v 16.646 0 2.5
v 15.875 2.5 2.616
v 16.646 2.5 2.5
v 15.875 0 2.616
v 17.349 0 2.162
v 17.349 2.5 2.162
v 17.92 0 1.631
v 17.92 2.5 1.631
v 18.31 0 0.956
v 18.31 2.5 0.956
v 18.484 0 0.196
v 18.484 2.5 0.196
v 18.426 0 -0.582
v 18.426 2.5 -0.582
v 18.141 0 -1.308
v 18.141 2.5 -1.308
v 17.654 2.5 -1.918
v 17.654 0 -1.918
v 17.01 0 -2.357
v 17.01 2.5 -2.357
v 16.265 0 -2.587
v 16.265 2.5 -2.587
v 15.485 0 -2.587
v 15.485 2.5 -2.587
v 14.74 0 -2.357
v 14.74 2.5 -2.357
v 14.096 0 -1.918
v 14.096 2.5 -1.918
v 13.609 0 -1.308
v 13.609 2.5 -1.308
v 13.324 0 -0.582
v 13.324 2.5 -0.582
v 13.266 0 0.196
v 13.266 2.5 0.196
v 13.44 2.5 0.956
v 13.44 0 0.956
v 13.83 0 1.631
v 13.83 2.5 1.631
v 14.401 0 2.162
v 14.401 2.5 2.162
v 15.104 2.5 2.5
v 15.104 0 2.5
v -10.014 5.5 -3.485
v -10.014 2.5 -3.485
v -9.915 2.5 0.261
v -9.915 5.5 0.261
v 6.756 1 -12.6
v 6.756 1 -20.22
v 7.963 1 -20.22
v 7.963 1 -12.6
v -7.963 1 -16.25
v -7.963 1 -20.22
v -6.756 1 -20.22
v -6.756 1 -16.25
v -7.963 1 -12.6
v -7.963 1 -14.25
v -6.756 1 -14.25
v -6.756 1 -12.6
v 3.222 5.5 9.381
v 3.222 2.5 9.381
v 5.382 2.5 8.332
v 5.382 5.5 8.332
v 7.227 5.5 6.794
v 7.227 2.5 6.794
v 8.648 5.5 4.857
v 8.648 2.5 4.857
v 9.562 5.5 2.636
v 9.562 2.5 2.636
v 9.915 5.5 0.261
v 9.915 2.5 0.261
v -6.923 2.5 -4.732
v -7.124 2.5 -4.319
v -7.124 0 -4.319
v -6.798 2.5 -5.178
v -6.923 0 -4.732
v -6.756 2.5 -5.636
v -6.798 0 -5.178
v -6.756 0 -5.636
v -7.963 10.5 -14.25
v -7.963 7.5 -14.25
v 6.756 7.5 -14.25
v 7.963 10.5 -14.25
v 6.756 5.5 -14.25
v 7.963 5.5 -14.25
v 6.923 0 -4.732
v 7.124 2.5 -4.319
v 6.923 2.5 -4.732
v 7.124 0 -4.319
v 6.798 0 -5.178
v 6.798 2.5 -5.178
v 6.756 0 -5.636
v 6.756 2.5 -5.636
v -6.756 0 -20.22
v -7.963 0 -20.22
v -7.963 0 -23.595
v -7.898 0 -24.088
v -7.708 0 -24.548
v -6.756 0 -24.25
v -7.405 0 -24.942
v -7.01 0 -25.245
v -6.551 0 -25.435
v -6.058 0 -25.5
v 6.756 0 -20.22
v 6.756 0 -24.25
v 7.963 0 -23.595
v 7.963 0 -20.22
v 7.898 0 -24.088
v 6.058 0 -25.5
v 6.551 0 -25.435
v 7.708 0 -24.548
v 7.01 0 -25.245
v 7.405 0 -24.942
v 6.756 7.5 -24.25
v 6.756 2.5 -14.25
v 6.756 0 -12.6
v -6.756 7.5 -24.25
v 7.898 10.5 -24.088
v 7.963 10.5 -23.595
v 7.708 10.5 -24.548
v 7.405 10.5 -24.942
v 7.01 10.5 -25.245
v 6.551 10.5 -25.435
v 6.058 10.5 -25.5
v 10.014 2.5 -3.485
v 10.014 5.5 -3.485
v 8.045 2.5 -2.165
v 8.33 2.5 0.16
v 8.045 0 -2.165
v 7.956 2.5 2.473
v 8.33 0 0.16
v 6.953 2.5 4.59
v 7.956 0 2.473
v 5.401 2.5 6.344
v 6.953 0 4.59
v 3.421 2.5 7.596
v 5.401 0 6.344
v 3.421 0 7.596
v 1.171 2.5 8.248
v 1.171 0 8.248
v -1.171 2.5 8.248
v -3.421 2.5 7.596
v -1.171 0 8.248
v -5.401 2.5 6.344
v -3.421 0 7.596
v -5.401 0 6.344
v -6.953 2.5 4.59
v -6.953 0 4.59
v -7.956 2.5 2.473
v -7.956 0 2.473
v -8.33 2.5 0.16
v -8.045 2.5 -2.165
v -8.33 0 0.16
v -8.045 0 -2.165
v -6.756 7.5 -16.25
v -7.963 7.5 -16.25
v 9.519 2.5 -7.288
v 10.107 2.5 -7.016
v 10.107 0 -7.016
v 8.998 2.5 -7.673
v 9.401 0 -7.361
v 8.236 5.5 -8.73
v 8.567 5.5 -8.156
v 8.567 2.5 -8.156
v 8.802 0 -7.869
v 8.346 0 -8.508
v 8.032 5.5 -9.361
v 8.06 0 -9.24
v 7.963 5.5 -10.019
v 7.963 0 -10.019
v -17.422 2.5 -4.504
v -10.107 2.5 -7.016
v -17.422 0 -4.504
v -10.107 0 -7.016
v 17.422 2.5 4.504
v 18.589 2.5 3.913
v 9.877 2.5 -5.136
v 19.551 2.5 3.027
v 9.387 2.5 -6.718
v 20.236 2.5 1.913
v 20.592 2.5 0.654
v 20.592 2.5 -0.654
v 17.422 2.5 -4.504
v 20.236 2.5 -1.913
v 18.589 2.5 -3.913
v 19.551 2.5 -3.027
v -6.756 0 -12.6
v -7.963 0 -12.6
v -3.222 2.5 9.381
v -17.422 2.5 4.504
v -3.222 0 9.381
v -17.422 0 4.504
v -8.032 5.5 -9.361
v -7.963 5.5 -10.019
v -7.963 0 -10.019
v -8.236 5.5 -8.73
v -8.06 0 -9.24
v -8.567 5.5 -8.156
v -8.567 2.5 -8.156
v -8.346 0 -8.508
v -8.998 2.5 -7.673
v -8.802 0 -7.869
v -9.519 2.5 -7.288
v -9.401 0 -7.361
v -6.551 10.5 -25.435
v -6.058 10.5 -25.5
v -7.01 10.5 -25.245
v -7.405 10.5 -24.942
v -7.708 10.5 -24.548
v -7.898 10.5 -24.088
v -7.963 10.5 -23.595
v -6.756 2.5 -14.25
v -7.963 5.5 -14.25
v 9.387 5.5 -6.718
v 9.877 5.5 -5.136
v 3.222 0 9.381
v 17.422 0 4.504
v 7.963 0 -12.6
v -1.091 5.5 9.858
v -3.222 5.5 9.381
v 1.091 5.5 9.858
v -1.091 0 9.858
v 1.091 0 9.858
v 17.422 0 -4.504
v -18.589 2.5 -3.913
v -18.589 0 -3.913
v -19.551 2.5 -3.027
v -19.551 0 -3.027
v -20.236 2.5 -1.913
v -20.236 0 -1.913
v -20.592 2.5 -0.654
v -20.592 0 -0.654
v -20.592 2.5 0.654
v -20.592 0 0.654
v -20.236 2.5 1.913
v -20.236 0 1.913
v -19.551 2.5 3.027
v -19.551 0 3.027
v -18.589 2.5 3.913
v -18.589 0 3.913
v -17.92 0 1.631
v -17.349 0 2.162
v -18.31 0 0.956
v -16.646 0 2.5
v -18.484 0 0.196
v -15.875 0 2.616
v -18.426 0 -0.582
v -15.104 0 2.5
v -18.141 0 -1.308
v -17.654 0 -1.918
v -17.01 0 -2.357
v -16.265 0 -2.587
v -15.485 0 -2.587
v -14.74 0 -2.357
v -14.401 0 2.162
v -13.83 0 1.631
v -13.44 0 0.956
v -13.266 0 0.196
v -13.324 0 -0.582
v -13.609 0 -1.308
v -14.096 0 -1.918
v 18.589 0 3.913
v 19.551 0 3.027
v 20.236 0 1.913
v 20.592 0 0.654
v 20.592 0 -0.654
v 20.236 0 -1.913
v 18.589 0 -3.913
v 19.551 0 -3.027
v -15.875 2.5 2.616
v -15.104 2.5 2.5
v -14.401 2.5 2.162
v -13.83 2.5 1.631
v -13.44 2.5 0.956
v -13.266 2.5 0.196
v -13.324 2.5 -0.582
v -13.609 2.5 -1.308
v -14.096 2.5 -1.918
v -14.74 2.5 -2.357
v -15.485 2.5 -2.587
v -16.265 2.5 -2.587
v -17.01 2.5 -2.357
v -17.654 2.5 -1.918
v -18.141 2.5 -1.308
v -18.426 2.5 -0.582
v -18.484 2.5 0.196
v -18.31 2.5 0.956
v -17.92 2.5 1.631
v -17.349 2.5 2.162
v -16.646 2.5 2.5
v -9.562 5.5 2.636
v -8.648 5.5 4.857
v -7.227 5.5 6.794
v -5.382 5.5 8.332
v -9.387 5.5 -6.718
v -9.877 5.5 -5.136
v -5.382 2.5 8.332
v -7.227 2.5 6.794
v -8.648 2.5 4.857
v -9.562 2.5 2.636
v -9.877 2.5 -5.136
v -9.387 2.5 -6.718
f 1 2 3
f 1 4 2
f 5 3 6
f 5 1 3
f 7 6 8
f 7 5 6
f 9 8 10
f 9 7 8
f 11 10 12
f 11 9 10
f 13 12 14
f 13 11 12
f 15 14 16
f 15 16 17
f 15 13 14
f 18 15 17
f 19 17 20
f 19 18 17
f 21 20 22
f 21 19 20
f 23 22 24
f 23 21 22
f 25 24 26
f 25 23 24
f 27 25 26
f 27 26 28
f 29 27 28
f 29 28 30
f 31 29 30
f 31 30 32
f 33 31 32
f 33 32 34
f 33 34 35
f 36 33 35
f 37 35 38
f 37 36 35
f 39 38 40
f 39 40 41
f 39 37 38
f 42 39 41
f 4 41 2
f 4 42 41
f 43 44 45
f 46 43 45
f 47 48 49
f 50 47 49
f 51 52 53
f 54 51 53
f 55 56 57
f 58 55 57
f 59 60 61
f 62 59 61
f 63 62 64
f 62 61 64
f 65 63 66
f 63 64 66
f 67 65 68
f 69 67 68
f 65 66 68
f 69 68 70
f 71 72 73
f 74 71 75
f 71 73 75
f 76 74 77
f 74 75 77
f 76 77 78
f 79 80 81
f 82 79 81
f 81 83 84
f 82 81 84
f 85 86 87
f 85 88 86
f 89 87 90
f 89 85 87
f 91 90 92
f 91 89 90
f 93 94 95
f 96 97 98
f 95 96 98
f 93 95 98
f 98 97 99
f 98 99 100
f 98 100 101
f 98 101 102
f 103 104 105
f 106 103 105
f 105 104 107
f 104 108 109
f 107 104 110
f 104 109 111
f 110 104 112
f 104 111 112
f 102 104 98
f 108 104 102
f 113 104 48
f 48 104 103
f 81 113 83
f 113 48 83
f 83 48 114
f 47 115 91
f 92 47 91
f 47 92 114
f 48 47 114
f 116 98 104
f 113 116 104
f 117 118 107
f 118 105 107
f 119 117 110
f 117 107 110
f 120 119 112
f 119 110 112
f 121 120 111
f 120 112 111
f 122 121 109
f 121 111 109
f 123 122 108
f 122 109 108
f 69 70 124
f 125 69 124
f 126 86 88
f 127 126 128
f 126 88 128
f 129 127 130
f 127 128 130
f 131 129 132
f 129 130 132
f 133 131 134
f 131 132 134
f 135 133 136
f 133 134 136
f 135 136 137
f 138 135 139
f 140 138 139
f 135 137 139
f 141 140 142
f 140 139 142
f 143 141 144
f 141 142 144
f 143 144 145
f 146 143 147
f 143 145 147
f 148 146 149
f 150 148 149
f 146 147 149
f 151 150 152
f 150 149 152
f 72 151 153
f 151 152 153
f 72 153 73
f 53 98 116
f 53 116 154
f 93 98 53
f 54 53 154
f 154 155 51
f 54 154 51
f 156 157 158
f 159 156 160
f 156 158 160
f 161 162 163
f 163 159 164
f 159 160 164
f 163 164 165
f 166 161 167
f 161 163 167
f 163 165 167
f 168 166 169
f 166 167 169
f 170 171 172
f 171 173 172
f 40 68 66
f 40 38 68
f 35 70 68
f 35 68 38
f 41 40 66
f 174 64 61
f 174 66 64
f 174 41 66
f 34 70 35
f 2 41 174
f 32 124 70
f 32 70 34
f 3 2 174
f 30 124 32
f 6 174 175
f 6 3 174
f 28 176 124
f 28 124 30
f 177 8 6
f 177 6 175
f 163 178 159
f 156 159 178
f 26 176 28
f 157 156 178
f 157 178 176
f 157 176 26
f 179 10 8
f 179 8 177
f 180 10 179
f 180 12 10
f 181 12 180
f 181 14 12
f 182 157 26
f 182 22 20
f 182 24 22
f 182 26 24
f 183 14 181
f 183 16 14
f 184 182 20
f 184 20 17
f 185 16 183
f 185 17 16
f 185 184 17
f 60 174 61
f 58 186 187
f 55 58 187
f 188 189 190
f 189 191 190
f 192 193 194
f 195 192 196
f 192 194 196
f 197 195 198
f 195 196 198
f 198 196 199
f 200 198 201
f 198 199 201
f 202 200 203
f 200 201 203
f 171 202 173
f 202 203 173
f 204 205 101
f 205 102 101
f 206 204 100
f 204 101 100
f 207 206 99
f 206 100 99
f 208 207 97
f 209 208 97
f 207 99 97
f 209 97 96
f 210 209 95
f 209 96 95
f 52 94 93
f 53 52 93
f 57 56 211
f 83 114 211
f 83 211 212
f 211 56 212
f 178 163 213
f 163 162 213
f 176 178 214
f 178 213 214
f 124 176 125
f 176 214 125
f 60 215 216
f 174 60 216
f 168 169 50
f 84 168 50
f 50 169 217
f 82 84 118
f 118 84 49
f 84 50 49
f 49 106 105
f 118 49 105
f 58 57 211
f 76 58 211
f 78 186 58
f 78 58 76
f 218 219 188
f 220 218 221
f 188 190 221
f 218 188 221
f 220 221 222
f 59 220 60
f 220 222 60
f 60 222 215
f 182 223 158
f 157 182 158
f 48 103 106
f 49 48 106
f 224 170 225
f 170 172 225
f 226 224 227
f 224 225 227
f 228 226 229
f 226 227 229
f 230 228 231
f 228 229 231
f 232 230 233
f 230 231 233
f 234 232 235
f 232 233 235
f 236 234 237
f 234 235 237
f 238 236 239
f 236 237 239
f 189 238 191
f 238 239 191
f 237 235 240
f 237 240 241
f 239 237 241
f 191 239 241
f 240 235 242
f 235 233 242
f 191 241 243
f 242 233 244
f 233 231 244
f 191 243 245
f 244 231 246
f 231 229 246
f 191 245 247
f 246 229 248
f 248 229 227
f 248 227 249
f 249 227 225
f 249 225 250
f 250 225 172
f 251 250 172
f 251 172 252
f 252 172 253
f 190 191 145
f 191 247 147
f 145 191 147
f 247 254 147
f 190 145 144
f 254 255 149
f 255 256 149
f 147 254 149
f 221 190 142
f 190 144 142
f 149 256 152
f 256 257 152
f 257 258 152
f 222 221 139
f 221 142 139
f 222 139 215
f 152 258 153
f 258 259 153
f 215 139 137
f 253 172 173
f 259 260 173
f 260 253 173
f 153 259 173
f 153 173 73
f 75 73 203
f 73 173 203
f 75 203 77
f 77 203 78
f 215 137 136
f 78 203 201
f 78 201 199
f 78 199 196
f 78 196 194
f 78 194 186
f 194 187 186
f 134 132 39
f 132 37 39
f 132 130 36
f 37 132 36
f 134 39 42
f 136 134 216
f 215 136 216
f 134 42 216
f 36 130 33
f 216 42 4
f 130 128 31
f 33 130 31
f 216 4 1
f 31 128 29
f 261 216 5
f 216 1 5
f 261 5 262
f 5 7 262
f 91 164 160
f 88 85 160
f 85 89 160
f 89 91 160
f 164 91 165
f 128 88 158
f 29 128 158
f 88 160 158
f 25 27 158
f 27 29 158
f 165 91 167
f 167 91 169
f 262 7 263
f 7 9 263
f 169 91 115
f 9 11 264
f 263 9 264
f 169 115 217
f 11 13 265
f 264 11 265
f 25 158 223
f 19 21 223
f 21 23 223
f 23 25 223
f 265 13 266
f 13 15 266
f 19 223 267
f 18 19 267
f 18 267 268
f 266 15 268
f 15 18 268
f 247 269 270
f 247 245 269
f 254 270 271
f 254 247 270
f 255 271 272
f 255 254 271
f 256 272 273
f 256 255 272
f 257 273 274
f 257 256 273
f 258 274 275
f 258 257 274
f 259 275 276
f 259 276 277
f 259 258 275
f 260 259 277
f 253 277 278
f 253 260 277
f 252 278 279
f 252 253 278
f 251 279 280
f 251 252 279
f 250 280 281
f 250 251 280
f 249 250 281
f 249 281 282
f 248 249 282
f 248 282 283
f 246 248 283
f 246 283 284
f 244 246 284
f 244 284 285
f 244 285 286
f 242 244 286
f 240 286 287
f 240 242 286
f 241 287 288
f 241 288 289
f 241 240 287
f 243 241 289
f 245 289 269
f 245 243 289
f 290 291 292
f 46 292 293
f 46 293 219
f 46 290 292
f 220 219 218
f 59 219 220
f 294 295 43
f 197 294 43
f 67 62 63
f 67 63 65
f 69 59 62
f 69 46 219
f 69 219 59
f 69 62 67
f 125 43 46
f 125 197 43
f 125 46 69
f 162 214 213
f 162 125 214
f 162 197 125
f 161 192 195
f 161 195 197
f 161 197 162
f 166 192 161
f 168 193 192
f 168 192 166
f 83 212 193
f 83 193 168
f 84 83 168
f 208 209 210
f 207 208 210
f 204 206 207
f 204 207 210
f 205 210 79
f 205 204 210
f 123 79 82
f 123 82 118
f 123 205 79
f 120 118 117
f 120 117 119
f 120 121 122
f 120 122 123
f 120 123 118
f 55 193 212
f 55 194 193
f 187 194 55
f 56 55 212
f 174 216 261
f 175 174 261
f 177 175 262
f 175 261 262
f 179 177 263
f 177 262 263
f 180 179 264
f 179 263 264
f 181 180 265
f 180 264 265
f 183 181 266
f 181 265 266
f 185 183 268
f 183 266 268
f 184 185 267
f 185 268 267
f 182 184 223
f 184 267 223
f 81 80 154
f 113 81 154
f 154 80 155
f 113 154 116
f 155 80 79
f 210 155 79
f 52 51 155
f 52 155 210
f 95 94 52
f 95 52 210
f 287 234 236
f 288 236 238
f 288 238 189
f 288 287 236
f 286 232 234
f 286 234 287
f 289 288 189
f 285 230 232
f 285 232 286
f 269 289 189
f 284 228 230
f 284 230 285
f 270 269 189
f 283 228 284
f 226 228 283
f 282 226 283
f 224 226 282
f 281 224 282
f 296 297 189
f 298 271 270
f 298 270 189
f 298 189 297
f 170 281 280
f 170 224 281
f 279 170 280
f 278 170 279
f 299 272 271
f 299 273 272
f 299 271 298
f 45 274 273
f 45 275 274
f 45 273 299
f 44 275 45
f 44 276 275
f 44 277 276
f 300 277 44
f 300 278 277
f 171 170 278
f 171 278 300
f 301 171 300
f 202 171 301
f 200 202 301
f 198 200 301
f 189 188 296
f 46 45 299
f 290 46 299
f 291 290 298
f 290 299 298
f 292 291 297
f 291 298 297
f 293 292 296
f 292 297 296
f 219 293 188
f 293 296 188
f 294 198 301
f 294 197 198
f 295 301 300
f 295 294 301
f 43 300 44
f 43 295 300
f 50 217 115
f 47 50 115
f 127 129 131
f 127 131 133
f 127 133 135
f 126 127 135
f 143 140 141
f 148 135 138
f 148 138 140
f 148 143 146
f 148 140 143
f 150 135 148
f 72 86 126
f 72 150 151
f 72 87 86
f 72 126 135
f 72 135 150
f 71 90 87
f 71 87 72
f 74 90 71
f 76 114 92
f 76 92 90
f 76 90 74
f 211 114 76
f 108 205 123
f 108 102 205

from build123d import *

# Parameters (mm, degrees)
BOSS_EXTRUDE1_DEPTH   = 1
SKETCH3_R             = 2.6162
BOSS_EXTRUDE1_2_DEPTH = 1
SKETCH4_R             = 2.6162
BOSS_EXTRUDE2_DEPTH   = 1.5
BOSS_EXTRUDE3_DEPTH   = 3
SKETCH6_W             = 15.9258
SKETCH6_H             = 11.25
BOSS_EXTRUDE4_DEPTH   = 5
SKETCH7_W             = 13.5128
SKETCH7_H             = 10
CUT_EXTRUDE1_DEPTH    = 5
CUT_EXTRUDE2_DEPTH    = 5
FILLET1_R             = 2.54
FILLET2_R             = 2.54
FILLET3_R             = 7.62
FILLET4_R             = 1.905


with BuildPart() as part:
    # Sketch3 → Boss-Extrude1 (new body)
    with BuildSketch(Plane(origin=(0, 0, 0), x_dir=(1, 0, 0), z_dir=(0, 1, 0))):
        Polygon((6.7564, 24.25), (6.7564, 20.22), (7.9629, 20.22), (7.9629, 25.5), (-7.9629, 25.5), (-7.9629, 20.22), (-6.7564, 20.22), (-6.7564, 24.25), align=None)
    extrude(amount=BOSS_EXTRUDE1_DEPTH)



with BuildPart() as body_2:
    # Sketch3 → Boss-Extrude1 2 (new body)
    with BuildSketch(Plane(origin=(0, 0, 0), x_dir=(1, 0, 0), z_dir=(0, 1, 0))):
        with BuildLine():
            Line((6.7564, 12.6), (6.7564, 4.876812672))
            ThreePointArc((6.7564, 4.876812672), (6.776225919, 4.847421317), (6.796505263, 4.818340964))
            ThreePointArc((6.796505263, 4.818340964), (0, -8.3312), (-6.796505263, 4.818340964))
            ThreePointArc((-6.796505263, 4.818340964), (-6.776225919, 4.847421317), (-6.7564, 4.876812672))
            Line((-6.7564, 4.876812672), (-6.7564, 12.6))
            Line((-6.7564, 12.6), (-7.9629, 12.6))
            Line((-7.9629, 12.6), (-7.9629, 10.019330915))
            ThreePointArc((-7.9629, 10.019330915), (-8.553832276, 8.174549356), (-10.10666, 7.016470768))
            Line((-10.10666, 7.016470768), (-17.42186, 4.50429022))
            ThreePointArc((-17.42186, 4.50429022), (-20.6375, 0), (-17.42186, -4.50429022))
            Line((-17.42186, -4.50429022), (-3.22159376, -9.380935099))
            ThreePointArc((-3.22159376, -9.380935099), (0, -9.9187), (3.22159376, -9.380935099))
            Line((3.22159376, -9.380935099), (17.42186, -4.50429022))
            ThreePointArc((17.42186, -4.50429022), (20.6375, 0), (17.42186, 4.50429022))
            Line((17.42186, 4.50429022), (10.10666, 7.016470768))
            ThreePointArc((10.10666, 7.016470768), (8.553832276, 8.174549356), (7.9629, 10.019330915))
            Line((7.9629, 10.019330915), (7.9629, 12.6))
            Line((7.9629, 12.6), (6.7564, 12.6))
        make_face()
        with Locations(Location((-15.875, 0, 0), (0, 0, 270))):
            Circle(SKETCH3_R, mode=Mode.SUBTRACT)
        with Locations(Location((15.875, 0, 0), (0, 0, 270))):
            Circle(SKETCH3_R, mode=Mode.SUBTRACT)
    extrude(amount=BOSS_EXTRUDE1_2_DEPTH)


with BuildPart() as part_1:
    add(part.part)

    add(body_2.part)  # Boss-Extrude2 merges body 2
    # Sketch4 → Boss-Extrude2 (add)
    with BuildSketch(Plane(origin=(0, 1, 0), x_dir=(1, 0, 0), z_dir=(0, 1, 0))):
        with BuildLine():
            Line((7.9629, 20.22), (7.9629, 25.5))
            Line((7.9629, 25.5), (-7.9629, 25.5))
            Line((-7.9629, 25.5), (-7.9629, 20.22))
            Line((-7.9629, 20.22), (-7.9629, 12.6))
            Line((-7.9629, 12.6), (-7.9629, 10.019330915))
            ThreePointArc((-7.9629, 10.019330915), (-8.553832276, 8.174549356), (-10.10666, 7.016470768))
            Line((-10.10666, 7.016470768), (-17.42186, 4.50429022))
            ThreePointArc((-17.42186, 4.50429022), (-20.6375, 0), (-17.42186, -4.50429022))
            Line((-17.42186, -4.50429022), (-3.22159376, -9.380935099))
            ThreePointArc((-3.22159376, -9.380935099), (0, -9.9187), (3.22159376, -9.380935099))
            Line((3.22159376, -9.380935099), (17.42186, -4.50429022))
            ThreePointArc((17.42186, -4.50429022), (20.6375, 0), (17.42186, 4.50429022))
            Line((17.42186, 4.50429022), (10.10666, 7.016470768))
            ThreePointArc((10.10666, 7.016470768), (8.553832276, 8.174549356), (7.9629, 10.019330915))
            Line((7.9629, 10.019330915), (7.9629, 12.6))
            Line((7.9629, 12.6), (7.9629, 20.22))
        make_face()
        with Locations(Location((15.875, 0, 0), (0, 0, 270))):
            Circle(SKETCH4_R, mode=Mode.SUBTRACT)
        with Locations(Location((-15.875, 0, 0), (0, 0, 270))):
            Circle(SKETCH4_R, mode=Mode.SUBTRACT)
        with BuildLine():
            Line((-6.7564, 24.25), (6.7564, 24.25))
            Line((6.7564, 24.25), (6.7564, 20.22))
            Line((6.7564, 20.22), (6.7564, 12.6))
            Line((6.7564, 12.6), (6.7564, 4.876812672))
            ThreePointArc((6.7564, 4.876812672), (6.776225919, 4.847421317), (6.796505263, 4.818340964))
            ThreePointArc((6.796505263, 4.818340964), (0, -8.3312), (-6.796505263, 4.818340964))
            ThreePointArc((-6.796505263, 4.818340964), (-6.776225919, 4.847421317), (-6.7564, 4.876812672))
            Line((-6.7564, 4.876812672), (-6.7564, 12.6))
            Line((-6.7564, 12.6), (-6.7564, 20.22))
            Line((-6.7564, 20.22), (-6.7564, 24.25))
        make_face(mode=Mode.SUBTRACT)
    extrude(amount=BOSS_EXTRUDE2_DEPTH)

    # Sketch5 → Boss-Extrude3 (add)
    # profile 1 of 2: a face of its own
    with BuildSketch(Plane(origin=(0, 2.5, 0), x_dir=(1, 0, 0), z_dir=(0, 1, 0))):
        with BuildLine():
            Line((-10.10666, 7.016470768), (-9.91527155, -0.260767662))
            ThreePointArc((-9.91527155, -0.260767662), (-7.996166023, -5.868725468), (-3.22159376, -9.380935099))
            ThreePointArc((-3.22159376, -9.380935099), (0, -9.9187), (3.22159376, -9.380935099))
            ThreePointArc((3.22159376, -9.380935099), (7.996166023, -5.868725468), (9.91527155, -0.260767662))
            Line((9.91527155, -0.260767662), (10.10666, 7.016470768))
            ThreePointArc((10.10666, 7.016470768), (8.553832276, 8.174549356), (7.9629, 10.019330915))
            Line((7.9629, 10.019330915), (7.9629, 25.5))
            Line((7.9629, 25.5), (-7.9629, 25.5))
            Line((-7.9629, 25.5), (-7.9629, 10.019330915))
            ThreePointArc((-7.9629, 10.019330915), (-8.553832276, 8.174549356), (-10.10666, 7.016470768))
        make_face()
        with BuildLine():
            Line((-6.7564, 4.876812672), (-6.7564, 24.25))
            Line((-6.7564, 24.25), (6.7564, 24.25))
            Line((6.7564, 24.25), (6.7564, 4.876812672))
            ThreePointArc((6.7564, 4.876812672), (6.776225919, 4.847421317), (6.796505263, 4.818340964))
            ThreePointArc((6.796505263, 4.818340964), (0, -8.3312), (-6.796505263, 4.818340964))
            ThreePointArc((-6.796505263, 4.818340964), (-6.776225919, 4.847421317), (-6.7564, 4.876812672))
        make_face(mode=Mode.SUBTRACT)
    # profile 2 of 2: a face of its own
    with BuildSketch(Plane(origin=(0, 2.5, 0), x_dir=(1, 0, 0), z_dir=(0, 1, 0))):
        with BuildLine():
            ThreePointArc((-6.796505263, 4.818340964), (-6.776225919, 4.847421317), (-6.7564, 4.876812672))
            Line((-6.7564, 4.876812672), (-6.7564, 24.25))
            Line((-6.7564, 24.25), (6.7564, 24.25))
            Line((6.7564, 24.25), (6.7564, 4.876812672))
            ThreePointArc((6.7564, 4.876812672), (6.776225919, 4.847421317), (6.796505263, 4.818340964))
            ThreePointArc((6.796505263, 4.818340964), (0, -8.3312), (-6.796505263, 4.818340964))
        make_face()
    extrude(amount=BOSS_EXTRUDE3_DEPTH)

    # Sketch6 → Boss-Extrude4 (add)
    with BuildSketch(Plane(origin=(0, 5.5, 0), x_dir=(1, 0, 0), z_dir=(0, 1, 0))):
        with Locations((0, 19.875)):
            Rectangle(SKETCH6_W, SKETCH6_H)
    extrude(amount=BOSS_EXTRUDE4_DEPTH)

    # Sketch7 → Cut-Extrude1 (cut)
    with BuildSketch(Plane.XZ.offset(-2.5)):
        with Locations((0, -19.25)):
            Rectangle(SKETCH7_W, SKETCH7_H)
    extrude(amount=-CUT_EXTRUDE1_DEPTH, mode=Mode.SUBTRACT)

    # Sketch8 → Cut-Extrude2 (cut)
    with BuildSketch(Plane.ZY.offset(7.9629)):
        Polygon((-16.25, 7.5), (-16.25, 1), (-14.25, 1), (-14.25, 5.5), (-14.25, 7.5), align=None)
    extrude(amount=-CUT_EXTRUDE2_DEPTH, mode=Mode.SUBTRACT)

    # Fillet1
    fillet1_edges = [part_1.edges().sort_by_distance(p)[0] for p in [
        (-6.7564, 1.25, -4.876812672),
    ]]
    fillet(fillet1_edges, radius=FILLET1_R)

    # Fillet2
    fillet2_edges = [part_1.edges().sort_by_distance(p)[0] for p in [
        (6.7564, 1.25, -4.876812672),
    ]]
    fillet(fillet2_edges, radius=FILLET2_R)

    # Fillet3
    fillet3_edges = [part_1.edges().sort_by_distance(p)[0] for p in [
        (10.10666, 4, -7.016470768),
        (-10.10666, 4, -7.016470768),
    ]]
    fillet(fillet3_edges, radius=FILLET3_R)

    # Fillet4
    fillet4_edges = [part_1.edges().sort_by_distance(p)[0] for p in [
        (-7.9629, 5.25, -25.5),
        (7.9629, 5.25, -25.5),
    ]]
    fillet(fillet4_edges, radius=FILLET4_R)


solid = part_1.part
